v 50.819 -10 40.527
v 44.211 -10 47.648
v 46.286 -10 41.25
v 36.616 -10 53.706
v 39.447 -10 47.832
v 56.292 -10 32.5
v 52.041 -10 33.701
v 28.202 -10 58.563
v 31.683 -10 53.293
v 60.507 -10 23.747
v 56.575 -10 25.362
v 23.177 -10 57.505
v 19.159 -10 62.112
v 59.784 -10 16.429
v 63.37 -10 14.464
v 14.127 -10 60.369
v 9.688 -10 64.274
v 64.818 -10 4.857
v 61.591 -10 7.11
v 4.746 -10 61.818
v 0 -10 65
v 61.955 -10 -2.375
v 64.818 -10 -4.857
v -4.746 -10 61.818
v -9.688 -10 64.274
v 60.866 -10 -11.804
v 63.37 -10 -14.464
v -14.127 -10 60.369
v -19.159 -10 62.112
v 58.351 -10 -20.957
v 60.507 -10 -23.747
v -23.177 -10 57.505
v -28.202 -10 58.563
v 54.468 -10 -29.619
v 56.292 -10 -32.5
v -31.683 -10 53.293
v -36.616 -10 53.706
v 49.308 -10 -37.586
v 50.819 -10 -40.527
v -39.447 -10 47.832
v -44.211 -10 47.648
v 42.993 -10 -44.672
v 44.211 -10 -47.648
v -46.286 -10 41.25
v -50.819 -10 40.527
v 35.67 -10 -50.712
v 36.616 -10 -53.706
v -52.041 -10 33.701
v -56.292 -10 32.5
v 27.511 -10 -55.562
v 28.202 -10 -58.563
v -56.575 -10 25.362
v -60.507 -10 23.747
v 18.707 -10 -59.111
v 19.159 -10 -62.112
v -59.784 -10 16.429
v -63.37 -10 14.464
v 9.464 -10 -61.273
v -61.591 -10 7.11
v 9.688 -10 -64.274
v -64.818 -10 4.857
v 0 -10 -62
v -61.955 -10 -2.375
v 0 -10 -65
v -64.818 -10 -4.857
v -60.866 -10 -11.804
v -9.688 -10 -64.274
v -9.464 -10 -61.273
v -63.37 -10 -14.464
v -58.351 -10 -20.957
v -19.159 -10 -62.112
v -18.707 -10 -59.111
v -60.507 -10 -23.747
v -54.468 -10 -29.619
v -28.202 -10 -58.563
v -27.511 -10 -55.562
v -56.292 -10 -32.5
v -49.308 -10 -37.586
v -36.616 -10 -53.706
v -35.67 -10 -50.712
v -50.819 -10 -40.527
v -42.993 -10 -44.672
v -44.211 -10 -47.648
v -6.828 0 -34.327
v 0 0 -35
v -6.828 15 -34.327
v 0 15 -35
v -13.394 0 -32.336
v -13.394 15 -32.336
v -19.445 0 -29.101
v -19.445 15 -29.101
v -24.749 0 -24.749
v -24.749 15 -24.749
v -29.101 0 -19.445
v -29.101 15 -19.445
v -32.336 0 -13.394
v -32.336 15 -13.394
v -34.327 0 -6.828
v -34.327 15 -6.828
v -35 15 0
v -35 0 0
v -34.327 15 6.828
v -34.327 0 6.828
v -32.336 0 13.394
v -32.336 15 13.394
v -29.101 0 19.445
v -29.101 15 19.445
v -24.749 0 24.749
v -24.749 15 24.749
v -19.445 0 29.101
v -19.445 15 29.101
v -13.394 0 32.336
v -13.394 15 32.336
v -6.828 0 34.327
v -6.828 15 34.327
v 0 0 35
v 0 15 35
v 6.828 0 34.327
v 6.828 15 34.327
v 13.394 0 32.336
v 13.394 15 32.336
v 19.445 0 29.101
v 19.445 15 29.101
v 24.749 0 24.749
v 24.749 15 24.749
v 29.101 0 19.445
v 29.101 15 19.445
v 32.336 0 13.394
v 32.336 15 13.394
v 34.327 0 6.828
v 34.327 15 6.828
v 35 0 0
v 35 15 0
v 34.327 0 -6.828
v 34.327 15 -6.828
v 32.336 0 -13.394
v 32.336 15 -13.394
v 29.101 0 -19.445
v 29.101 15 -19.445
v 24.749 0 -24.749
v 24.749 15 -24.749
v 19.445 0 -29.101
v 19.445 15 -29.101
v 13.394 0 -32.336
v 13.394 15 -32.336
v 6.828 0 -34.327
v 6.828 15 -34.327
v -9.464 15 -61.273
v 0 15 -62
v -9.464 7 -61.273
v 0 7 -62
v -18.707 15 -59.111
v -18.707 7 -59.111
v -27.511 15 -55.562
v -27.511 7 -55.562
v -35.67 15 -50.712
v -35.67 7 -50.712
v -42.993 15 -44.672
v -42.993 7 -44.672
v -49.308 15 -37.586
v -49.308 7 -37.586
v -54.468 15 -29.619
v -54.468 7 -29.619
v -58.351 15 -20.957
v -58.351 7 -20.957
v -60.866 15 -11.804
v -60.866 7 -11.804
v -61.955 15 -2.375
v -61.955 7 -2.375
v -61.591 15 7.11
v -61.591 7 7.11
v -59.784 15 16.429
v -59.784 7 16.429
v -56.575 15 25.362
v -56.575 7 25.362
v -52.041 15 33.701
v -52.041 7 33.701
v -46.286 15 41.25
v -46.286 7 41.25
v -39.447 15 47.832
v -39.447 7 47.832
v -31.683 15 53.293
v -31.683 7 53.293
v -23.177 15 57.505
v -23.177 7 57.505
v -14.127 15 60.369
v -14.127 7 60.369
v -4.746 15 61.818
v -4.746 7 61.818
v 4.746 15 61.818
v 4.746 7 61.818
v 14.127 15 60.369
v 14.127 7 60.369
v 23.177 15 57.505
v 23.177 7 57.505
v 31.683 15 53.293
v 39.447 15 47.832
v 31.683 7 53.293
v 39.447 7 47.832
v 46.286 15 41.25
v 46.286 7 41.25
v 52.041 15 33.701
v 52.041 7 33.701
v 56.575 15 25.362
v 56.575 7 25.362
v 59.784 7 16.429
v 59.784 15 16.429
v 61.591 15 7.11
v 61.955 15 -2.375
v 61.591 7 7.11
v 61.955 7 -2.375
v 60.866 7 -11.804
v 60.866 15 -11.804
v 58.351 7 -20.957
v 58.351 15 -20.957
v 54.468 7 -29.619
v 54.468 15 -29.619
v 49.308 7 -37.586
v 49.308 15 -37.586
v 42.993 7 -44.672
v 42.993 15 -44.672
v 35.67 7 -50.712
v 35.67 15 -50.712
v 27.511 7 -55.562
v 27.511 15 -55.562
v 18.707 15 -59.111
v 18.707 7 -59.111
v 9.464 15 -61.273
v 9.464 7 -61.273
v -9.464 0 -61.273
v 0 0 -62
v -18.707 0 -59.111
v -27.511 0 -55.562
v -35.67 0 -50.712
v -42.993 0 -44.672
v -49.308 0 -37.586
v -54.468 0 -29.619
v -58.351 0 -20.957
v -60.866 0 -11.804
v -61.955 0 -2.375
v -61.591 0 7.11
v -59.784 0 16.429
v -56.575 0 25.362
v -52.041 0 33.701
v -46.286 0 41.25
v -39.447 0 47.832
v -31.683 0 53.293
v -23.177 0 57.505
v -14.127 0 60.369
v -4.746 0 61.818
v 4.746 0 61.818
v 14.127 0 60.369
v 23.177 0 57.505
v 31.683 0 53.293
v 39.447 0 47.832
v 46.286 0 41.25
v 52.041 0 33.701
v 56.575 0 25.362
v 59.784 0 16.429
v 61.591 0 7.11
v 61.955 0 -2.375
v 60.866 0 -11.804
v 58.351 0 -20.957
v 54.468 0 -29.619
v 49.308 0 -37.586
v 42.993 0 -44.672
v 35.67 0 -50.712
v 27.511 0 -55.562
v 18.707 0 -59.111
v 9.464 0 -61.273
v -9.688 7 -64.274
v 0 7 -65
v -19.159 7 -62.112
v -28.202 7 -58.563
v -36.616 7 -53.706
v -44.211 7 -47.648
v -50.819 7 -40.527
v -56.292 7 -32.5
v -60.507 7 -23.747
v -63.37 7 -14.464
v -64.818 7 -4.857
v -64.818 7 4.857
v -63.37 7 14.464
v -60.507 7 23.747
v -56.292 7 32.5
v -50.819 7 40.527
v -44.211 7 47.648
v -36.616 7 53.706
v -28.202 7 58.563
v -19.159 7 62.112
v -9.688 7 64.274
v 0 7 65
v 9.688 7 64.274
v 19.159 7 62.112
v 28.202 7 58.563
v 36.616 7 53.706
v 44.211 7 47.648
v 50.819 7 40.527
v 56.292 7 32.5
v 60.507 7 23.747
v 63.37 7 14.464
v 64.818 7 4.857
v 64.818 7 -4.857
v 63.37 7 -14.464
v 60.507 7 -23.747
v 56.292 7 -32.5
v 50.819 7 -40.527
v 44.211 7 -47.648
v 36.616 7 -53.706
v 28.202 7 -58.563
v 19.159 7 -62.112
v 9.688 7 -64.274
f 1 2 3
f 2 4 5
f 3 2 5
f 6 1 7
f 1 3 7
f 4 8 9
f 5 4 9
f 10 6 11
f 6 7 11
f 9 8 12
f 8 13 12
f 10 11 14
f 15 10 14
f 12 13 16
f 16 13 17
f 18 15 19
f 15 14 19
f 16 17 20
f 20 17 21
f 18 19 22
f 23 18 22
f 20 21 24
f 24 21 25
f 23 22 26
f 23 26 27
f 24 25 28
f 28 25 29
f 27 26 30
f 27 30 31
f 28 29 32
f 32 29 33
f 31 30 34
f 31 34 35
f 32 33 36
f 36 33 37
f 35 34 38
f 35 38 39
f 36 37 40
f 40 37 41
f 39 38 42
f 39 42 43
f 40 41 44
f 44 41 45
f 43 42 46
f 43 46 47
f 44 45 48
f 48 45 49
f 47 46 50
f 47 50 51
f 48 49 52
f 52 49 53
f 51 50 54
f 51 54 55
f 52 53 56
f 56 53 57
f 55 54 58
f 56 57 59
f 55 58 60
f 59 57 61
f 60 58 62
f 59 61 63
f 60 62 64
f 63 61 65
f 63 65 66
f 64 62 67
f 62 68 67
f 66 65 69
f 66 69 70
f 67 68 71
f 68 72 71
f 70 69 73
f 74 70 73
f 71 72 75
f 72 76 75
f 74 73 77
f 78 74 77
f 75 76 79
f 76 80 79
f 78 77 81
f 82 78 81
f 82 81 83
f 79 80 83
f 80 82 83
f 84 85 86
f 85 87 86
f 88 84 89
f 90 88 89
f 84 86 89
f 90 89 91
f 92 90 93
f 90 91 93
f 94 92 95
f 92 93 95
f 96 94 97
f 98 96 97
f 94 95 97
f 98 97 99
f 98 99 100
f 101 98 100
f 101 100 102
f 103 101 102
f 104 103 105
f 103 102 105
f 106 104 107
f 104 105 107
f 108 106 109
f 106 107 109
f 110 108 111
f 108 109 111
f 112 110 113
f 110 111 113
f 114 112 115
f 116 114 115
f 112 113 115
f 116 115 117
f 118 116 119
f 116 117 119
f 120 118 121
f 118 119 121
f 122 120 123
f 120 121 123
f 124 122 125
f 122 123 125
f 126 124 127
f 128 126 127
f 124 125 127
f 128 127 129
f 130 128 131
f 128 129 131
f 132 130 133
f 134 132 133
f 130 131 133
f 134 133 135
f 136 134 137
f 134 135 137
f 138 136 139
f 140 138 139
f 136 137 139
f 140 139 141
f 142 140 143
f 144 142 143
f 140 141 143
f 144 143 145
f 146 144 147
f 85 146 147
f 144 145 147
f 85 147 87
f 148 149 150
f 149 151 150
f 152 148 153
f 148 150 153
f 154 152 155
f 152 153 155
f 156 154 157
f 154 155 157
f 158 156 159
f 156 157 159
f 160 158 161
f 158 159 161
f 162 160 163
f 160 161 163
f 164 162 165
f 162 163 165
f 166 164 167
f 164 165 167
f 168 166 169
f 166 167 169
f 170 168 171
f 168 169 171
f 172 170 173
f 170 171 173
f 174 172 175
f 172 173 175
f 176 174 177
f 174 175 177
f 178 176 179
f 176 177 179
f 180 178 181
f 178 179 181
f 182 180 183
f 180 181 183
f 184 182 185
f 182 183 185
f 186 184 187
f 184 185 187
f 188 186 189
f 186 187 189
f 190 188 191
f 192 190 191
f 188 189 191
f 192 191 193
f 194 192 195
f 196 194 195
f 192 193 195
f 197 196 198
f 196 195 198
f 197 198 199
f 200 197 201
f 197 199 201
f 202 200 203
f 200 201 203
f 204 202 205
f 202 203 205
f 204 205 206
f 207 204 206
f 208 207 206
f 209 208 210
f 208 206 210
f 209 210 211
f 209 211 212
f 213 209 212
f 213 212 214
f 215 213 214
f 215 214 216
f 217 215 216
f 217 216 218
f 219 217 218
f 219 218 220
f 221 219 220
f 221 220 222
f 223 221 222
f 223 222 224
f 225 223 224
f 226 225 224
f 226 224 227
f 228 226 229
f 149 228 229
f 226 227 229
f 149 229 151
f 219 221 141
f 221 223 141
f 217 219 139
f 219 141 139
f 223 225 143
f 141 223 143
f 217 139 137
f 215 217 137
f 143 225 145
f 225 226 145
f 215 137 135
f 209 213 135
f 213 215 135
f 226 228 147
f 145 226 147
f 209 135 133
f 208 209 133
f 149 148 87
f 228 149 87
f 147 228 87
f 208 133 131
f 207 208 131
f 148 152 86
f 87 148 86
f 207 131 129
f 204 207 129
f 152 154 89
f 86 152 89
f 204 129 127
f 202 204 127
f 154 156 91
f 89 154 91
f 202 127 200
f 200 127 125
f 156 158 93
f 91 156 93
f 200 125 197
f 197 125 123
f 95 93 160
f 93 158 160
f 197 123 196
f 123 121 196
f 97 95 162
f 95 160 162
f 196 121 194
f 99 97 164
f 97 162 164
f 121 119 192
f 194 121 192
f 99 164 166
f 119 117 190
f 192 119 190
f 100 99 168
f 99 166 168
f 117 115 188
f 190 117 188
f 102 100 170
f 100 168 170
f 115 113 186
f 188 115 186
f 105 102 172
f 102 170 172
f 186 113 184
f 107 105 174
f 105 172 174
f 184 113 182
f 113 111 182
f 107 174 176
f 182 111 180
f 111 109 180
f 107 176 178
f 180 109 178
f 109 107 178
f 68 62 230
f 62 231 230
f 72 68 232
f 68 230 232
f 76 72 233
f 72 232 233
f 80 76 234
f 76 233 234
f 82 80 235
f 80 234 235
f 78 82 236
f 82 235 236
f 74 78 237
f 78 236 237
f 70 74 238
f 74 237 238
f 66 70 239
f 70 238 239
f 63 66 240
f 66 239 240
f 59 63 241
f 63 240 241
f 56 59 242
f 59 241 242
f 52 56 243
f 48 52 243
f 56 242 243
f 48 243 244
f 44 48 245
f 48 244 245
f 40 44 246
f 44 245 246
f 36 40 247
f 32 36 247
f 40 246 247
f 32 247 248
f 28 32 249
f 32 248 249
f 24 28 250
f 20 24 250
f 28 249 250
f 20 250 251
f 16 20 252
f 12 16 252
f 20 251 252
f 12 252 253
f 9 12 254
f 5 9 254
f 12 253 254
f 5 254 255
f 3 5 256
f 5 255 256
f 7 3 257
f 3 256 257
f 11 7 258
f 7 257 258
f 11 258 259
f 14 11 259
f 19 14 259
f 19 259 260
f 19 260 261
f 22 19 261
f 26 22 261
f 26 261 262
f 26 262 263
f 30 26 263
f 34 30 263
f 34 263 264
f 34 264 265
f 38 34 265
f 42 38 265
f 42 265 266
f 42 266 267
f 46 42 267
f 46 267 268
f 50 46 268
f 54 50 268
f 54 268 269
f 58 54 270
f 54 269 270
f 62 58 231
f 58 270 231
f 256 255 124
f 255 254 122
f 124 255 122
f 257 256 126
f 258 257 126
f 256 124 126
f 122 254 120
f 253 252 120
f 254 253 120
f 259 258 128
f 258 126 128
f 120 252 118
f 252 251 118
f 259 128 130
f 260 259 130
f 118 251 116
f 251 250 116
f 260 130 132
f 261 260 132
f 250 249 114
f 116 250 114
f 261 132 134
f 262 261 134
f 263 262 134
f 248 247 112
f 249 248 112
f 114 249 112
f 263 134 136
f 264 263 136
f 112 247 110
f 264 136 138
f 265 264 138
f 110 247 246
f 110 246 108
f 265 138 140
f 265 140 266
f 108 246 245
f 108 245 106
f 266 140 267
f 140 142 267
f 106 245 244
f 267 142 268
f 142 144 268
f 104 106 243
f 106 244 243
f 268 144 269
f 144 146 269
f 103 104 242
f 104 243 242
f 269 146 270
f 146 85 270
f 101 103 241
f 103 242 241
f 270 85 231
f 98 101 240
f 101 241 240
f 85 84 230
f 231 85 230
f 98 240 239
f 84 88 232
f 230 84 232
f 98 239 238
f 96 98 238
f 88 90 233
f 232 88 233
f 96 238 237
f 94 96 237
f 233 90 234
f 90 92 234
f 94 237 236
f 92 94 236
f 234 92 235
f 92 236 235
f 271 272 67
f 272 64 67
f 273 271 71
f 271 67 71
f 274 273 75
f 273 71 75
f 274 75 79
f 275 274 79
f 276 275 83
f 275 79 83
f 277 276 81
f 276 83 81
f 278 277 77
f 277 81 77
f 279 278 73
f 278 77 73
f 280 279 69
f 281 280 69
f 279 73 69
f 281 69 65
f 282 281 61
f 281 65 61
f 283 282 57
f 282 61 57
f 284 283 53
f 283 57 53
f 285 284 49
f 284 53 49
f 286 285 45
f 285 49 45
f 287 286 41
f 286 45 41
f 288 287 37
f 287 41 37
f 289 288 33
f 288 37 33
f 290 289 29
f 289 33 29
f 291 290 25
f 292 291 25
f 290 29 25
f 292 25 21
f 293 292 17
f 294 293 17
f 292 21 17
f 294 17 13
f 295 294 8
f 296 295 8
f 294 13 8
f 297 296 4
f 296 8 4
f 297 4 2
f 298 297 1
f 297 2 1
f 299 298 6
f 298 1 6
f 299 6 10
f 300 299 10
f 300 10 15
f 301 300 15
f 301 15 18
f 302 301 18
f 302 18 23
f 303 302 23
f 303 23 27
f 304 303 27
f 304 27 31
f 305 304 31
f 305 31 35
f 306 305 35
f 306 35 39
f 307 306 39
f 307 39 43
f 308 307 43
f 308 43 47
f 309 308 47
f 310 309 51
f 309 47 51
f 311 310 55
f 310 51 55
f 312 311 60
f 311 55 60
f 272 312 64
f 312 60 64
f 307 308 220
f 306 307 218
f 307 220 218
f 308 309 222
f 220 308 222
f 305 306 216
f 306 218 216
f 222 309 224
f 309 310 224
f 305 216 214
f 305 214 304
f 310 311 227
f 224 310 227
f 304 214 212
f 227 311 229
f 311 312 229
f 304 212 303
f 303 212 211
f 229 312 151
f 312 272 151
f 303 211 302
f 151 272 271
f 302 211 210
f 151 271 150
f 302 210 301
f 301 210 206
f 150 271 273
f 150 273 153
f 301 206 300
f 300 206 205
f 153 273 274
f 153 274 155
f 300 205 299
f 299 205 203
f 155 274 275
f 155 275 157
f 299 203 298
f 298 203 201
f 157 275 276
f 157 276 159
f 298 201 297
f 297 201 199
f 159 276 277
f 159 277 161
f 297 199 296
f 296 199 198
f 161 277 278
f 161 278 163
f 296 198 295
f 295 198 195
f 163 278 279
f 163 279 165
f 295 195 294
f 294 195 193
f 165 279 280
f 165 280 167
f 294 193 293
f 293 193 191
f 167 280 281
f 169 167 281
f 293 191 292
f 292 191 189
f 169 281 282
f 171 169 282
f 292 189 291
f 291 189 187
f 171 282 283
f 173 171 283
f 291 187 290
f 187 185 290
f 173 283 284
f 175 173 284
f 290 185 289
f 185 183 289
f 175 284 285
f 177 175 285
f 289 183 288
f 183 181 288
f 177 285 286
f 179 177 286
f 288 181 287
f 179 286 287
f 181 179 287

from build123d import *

# Parameters (mm, degrees)
SZKIC1_W = 3
SZKIC1_H = 10


with BuildPart() as part:
    # Szkic1 → Obrót1 (revolve)
    with BuildSketch(Plane.XY, mode=Mode.PRIVATE) as obr_t1_sk:
        Polygon((-62, 0), (-35, 0), (-35, 15), (-62, 15), (-62, 7), (-65, 7), (-65, 0), align=None)
        with Locations((-63.5, -5)):
            Rectangle(SZKIC1_W, SZKIC1_H)
    revolve(obr_t1_sk.sketch.rotate(Axis((0, 0, 0), (0, 1, 0)), 270), axis=Axis((0, 0, 0), (0, 1, 0)))


solid = part.part
